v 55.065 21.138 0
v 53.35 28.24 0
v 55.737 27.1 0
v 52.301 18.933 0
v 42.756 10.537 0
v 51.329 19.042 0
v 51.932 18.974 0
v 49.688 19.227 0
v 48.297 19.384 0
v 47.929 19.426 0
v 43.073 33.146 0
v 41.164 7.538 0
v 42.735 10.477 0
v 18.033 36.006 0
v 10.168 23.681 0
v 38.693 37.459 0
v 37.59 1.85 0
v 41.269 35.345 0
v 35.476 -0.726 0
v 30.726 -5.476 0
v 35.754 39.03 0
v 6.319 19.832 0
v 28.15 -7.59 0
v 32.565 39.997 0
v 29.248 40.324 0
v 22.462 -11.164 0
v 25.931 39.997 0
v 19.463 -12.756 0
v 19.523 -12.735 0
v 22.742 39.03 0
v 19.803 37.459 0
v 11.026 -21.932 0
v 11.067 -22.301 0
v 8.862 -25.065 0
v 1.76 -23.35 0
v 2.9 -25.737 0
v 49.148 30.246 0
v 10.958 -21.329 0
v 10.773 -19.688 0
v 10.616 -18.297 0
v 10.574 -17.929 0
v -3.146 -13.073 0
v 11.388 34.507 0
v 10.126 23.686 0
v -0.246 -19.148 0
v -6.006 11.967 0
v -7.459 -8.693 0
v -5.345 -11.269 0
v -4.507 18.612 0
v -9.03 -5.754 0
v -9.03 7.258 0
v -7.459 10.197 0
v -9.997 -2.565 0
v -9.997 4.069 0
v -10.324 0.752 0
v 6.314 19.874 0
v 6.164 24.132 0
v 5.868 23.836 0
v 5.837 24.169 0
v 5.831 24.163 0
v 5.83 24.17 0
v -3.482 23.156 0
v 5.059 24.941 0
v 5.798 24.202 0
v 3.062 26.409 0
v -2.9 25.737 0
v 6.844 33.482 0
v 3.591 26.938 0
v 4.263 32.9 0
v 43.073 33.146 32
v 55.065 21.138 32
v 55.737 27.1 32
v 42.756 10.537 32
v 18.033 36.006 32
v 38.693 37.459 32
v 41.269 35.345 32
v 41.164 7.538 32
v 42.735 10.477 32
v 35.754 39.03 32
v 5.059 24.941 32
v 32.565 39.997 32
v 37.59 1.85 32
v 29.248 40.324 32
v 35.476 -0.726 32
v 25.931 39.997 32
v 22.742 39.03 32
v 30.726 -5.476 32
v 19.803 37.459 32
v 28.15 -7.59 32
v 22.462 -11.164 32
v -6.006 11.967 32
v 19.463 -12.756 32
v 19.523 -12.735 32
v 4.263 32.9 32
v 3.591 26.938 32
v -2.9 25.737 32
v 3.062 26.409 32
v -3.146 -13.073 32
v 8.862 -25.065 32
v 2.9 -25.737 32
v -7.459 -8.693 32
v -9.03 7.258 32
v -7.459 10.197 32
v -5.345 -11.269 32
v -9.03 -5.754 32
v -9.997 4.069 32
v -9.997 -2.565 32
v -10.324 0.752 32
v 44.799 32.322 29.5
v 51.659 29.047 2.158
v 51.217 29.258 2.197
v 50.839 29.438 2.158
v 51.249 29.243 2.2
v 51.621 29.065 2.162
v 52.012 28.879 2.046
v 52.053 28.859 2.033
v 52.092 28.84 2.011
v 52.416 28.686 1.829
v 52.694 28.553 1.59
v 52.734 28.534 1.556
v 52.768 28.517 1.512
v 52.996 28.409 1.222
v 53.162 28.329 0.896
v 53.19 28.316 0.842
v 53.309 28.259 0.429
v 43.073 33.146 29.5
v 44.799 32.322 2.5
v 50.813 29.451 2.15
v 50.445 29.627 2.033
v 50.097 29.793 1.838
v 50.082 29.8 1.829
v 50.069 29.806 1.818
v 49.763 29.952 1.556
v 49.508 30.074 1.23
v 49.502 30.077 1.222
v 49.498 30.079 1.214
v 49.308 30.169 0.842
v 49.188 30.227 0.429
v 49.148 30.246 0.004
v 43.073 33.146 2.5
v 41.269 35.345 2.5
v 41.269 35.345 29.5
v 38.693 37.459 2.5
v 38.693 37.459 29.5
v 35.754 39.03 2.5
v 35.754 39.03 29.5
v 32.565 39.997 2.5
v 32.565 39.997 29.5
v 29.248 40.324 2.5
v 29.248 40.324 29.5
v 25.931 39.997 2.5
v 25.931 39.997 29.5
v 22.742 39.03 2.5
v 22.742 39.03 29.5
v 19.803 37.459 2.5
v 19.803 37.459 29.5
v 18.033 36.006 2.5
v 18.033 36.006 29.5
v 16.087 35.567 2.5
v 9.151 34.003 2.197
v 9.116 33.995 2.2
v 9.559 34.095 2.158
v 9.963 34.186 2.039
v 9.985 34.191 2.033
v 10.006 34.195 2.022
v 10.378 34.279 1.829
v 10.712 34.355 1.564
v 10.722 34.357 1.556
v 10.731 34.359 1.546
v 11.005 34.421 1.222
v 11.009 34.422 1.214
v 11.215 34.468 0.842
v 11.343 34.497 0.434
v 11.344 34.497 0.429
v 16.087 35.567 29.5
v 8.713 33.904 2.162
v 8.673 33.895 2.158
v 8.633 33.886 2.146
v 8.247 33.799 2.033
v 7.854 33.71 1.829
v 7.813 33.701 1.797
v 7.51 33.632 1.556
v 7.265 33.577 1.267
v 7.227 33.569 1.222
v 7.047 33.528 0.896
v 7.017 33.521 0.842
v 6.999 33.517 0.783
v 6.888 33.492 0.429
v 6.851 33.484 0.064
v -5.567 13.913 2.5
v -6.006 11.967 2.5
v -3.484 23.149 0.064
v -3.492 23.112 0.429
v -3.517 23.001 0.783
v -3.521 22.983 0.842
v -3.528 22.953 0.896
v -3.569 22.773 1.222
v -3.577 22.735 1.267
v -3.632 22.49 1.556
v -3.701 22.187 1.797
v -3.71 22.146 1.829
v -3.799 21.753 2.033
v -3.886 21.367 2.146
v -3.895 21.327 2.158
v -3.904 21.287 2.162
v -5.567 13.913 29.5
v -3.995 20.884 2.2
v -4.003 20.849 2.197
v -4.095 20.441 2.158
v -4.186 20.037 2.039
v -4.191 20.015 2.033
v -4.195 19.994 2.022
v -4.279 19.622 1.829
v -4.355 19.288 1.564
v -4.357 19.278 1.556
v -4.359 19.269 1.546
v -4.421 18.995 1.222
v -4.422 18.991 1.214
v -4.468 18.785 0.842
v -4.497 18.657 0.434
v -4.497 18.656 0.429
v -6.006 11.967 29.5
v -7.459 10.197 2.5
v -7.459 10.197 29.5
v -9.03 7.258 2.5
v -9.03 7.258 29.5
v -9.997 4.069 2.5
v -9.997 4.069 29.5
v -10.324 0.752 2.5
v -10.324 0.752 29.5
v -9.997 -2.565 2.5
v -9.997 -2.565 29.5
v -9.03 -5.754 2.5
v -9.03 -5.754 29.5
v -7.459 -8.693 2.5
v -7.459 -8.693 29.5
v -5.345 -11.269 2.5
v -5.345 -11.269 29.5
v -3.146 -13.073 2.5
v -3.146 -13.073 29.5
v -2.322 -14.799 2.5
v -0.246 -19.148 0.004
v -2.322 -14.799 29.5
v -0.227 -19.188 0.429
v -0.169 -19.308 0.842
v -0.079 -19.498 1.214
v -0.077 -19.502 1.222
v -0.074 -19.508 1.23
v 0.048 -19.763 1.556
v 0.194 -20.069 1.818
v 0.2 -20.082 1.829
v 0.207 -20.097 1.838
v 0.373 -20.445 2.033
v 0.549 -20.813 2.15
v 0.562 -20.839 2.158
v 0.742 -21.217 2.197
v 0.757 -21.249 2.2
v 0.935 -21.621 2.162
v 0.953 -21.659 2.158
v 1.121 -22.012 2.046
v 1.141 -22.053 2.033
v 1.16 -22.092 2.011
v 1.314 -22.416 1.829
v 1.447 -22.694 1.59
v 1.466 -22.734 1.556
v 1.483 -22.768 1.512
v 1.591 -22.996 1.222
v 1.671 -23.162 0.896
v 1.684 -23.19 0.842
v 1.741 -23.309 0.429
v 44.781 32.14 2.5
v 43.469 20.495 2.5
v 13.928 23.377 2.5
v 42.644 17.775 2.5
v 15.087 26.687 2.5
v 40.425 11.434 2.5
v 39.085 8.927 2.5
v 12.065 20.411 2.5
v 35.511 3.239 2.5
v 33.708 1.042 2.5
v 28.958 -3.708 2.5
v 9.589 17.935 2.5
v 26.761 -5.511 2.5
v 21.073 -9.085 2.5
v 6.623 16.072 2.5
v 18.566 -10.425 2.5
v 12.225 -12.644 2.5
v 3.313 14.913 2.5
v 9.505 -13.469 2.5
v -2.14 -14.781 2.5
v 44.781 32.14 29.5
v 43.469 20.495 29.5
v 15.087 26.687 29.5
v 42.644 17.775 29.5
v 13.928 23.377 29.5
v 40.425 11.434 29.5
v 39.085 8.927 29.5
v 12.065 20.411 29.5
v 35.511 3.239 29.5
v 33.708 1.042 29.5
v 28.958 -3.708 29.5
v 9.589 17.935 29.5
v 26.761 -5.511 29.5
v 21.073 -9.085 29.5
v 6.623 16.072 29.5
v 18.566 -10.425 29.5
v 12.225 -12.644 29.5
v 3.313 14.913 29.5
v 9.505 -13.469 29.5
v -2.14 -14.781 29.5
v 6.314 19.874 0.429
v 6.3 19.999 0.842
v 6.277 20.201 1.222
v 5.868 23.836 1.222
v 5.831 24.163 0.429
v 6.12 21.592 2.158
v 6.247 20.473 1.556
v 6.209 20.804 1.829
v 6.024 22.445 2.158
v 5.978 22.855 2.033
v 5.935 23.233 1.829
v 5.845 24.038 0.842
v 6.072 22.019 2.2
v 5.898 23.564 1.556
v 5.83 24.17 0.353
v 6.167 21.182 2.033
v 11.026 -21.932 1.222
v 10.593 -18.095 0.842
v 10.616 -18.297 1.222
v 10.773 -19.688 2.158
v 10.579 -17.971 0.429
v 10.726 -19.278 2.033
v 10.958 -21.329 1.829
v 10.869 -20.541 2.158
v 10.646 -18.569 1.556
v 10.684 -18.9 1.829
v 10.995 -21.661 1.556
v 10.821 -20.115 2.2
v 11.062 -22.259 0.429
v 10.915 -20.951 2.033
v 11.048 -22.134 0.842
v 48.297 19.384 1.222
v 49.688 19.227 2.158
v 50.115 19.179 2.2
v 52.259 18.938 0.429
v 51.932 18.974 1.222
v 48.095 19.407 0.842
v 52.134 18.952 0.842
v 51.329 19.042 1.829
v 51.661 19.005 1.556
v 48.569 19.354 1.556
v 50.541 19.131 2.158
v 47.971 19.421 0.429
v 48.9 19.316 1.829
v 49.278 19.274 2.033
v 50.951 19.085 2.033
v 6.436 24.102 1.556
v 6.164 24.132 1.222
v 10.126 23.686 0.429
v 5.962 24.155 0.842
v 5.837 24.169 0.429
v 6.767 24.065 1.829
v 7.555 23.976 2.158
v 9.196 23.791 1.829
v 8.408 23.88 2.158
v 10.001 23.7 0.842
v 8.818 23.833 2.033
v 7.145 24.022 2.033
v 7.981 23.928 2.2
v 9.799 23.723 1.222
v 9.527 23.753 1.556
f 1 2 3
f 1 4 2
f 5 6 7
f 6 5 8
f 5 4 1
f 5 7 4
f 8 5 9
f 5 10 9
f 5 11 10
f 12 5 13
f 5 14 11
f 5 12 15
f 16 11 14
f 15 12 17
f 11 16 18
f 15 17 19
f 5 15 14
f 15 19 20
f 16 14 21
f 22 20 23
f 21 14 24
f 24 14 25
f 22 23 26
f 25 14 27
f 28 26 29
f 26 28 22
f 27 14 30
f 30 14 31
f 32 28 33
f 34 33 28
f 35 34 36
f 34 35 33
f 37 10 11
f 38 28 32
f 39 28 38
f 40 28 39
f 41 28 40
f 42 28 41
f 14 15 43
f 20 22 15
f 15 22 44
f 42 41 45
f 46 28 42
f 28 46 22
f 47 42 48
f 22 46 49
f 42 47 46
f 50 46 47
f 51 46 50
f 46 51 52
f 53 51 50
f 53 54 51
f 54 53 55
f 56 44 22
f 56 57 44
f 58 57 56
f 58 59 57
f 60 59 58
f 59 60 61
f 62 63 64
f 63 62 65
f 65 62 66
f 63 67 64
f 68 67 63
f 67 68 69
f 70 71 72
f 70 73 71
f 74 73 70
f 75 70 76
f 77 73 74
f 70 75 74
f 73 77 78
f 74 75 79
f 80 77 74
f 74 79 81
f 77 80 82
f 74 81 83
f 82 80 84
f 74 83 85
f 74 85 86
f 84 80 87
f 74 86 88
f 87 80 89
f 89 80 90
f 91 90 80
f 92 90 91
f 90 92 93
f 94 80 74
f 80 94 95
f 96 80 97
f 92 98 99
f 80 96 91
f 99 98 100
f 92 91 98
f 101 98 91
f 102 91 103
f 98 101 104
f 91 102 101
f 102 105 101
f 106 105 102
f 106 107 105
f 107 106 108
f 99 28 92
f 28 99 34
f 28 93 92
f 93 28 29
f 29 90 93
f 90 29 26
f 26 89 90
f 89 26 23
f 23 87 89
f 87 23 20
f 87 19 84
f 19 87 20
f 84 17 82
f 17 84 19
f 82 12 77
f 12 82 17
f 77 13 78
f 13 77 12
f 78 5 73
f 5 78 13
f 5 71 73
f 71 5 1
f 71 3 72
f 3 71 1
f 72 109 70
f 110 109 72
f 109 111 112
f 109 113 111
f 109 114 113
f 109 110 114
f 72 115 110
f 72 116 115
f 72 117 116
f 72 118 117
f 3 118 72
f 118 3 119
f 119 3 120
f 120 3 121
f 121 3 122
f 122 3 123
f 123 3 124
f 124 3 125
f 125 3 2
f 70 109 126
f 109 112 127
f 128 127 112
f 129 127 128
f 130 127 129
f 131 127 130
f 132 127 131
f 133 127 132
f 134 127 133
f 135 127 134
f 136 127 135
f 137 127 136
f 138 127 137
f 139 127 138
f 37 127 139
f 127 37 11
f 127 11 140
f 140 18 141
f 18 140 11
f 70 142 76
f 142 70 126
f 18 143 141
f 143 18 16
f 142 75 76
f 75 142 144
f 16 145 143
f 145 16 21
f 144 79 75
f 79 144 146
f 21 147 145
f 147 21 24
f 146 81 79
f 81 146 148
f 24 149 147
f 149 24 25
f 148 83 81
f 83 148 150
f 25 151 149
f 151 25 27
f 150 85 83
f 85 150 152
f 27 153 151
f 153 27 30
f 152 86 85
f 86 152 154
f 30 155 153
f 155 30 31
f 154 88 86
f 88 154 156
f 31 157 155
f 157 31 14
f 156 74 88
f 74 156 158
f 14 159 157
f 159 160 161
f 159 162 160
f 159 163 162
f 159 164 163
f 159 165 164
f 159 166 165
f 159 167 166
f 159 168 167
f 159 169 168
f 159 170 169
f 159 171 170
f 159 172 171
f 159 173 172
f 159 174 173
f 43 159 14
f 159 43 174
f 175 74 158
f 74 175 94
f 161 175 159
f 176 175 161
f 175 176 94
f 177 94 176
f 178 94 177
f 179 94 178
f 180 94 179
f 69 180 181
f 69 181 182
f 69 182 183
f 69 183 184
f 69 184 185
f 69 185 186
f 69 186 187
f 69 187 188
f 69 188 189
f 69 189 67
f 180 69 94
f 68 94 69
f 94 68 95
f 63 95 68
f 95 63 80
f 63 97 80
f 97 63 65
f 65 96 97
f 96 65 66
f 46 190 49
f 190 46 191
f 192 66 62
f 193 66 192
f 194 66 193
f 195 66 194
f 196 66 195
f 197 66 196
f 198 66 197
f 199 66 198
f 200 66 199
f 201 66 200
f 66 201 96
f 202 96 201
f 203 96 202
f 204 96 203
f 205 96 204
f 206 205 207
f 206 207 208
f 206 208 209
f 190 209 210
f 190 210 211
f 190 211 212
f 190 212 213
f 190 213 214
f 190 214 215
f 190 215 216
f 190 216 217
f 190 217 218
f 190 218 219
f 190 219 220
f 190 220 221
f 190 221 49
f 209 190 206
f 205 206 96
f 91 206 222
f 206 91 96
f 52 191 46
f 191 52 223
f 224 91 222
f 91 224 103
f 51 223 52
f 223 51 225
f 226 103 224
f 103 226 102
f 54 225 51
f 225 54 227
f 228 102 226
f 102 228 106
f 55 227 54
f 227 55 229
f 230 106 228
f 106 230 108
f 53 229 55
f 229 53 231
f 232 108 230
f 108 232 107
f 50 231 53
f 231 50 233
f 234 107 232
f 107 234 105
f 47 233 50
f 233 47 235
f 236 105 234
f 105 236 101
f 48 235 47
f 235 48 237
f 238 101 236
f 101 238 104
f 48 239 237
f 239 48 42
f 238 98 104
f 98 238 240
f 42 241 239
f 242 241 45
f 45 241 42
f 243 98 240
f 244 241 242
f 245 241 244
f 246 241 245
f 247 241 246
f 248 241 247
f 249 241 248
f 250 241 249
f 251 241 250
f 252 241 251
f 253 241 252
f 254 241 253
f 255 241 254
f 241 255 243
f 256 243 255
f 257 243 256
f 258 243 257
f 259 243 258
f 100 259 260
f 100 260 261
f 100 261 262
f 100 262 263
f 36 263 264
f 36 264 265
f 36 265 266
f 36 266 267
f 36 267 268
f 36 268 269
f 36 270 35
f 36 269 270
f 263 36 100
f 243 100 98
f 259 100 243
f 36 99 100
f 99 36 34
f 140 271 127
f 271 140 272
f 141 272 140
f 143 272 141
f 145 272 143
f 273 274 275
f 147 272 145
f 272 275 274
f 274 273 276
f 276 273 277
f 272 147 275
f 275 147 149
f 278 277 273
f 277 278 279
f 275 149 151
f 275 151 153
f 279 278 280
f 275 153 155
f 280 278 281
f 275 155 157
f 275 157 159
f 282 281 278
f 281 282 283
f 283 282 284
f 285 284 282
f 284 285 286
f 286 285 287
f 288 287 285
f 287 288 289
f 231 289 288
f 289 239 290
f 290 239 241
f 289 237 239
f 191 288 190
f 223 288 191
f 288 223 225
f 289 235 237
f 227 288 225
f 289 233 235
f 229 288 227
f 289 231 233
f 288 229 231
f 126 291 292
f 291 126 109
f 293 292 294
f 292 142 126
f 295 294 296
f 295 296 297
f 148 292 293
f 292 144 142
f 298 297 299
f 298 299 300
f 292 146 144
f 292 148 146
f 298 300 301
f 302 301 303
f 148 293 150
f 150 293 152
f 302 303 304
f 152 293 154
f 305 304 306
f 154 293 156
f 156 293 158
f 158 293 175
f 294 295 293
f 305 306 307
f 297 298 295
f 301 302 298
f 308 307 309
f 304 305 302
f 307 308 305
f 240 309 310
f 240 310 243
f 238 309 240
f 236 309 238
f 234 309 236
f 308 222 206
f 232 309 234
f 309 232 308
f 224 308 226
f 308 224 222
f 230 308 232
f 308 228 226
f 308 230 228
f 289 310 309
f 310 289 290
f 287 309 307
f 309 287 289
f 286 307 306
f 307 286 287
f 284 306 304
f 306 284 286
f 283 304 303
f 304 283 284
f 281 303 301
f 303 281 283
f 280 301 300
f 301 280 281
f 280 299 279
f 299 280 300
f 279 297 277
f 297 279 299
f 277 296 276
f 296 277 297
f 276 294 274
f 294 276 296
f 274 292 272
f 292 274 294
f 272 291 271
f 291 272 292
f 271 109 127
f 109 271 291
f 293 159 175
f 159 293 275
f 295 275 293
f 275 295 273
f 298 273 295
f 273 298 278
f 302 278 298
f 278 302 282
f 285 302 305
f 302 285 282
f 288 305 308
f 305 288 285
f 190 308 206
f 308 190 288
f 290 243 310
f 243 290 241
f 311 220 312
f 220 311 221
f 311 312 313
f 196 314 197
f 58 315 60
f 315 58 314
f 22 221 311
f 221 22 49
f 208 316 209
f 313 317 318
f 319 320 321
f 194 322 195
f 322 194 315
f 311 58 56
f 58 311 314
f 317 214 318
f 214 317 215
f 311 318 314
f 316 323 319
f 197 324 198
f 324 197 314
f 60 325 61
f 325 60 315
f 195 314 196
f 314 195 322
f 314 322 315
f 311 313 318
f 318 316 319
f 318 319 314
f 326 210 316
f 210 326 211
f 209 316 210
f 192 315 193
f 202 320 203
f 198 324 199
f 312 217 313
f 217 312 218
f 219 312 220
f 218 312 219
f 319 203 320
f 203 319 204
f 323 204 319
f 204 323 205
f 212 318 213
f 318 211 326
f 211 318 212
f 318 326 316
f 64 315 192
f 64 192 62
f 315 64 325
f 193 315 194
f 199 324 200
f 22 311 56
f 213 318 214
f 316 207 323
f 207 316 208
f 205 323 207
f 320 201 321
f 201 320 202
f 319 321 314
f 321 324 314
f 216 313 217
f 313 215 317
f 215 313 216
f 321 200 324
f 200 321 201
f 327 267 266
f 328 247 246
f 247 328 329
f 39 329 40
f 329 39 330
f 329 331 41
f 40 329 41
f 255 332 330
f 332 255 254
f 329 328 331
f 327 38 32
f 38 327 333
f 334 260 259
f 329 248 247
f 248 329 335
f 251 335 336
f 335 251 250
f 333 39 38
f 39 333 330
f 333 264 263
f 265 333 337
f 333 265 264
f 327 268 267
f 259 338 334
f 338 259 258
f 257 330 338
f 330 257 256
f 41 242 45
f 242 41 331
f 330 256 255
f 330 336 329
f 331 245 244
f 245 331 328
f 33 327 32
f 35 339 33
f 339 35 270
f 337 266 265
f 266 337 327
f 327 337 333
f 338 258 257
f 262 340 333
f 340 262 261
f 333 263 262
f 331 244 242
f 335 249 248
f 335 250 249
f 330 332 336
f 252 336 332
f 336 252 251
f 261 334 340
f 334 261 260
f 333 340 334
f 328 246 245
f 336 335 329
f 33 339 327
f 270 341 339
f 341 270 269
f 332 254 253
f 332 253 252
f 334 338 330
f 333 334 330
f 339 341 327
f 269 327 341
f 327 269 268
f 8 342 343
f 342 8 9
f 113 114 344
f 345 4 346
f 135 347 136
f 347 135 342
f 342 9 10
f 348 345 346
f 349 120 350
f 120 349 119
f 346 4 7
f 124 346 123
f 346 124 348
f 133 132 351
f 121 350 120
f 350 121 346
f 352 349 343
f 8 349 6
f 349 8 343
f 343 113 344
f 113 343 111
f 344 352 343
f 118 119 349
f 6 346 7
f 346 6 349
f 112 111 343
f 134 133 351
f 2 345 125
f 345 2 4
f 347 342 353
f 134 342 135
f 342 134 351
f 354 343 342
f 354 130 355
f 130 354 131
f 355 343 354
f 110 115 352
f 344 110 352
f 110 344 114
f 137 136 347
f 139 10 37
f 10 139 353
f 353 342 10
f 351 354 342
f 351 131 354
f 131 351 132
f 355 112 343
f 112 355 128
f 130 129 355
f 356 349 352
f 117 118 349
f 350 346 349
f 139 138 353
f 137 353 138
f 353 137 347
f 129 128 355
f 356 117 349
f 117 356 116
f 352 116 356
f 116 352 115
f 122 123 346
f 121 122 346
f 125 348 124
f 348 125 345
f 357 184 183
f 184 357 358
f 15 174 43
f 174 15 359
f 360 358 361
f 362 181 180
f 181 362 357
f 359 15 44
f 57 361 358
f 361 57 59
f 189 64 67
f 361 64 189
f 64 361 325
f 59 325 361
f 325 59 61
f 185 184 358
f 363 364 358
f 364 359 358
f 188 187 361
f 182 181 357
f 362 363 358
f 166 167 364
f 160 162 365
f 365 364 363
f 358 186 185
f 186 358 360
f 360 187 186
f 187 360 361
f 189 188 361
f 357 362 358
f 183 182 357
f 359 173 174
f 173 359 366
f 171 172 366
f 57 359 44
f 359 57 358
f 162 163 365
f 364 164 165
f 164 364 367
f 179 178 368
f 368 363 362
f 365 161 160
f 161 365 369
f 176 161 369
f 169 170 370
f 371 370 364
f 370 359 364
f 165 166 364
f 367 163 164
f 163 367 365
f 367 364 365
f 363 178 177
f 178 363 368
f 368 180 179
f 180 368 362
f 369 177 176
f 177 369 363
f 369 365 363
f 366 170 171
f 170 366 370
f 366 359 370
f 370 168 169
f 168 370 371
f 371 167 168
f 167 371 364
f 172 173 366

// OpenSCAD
$fn = 32;

// ----------------------------------------------------------------------
// Air duct: 34 mm duct, 2.5 mm wall, 32 mm across
// ----------------------------------------------------------------------

// --- parameters (mm) ---
duct_r = 17;              // duct core radius
duct_d = 34;              // duct core diameter
wall = 2.5;               // duct wall thickness
height = 32;              // duct width (extrusion height)
port_r = 25.9;            // port flange half width
port_d = 51.8;            // port flange width
port_t = 6;               // port flange thickness
bolt_d = 4.4;             // port bolt holes
bolt_offset = 21.2;       // bolt hole offset from the port axis

difference() {
  /* outer hull chain: tube with a flat flange plate at every port */
  linear_extrude(height = 32) {
    hull() {
      polygon([[2.9, -25.737], [-2.9, 25.737], [3.062, 26.409], [8.862, -25.065]]);
      translate([8.943, 1.008]) circle(r = 17);
    }
    hull() {
      translate([8.943, 1.008]) circle(r = 17);
      translate([6.676, 0.752]) circle(r = 17);
    }
    hull() {
      translate([6.676, 0.752]) circle(r = 17);
      translate([13.017, 2.971]) circle(r = 17);
    }
    hull() {
      translate([13.017, 2.971]) circle(r = 17);
      translate([18.705, 6.545]) circle(r = 17);
    }
    hull() {
      translate([18.705, 6.545]) circle(r = 17);
      translate([23.455, 11.295]) circle(r = 17);
    }
    hull() {
      translate([23.455, 11.295]) circle(r = 17);
      translate([27.029, 16.983]) circle(r = 17);
    }
    hull() {
      translate([27.029, 16.983]) circle(r = 17);
      translate([29.248, 23.324]) circle(r = 17);
    }
    hull() {
      translate([29.248, 23.324]) circle(r = 17);
      translate([28.992, 21.057]) circle(r = 17);
    }
    hull() {
      translate([28.992, 21.057]) circle(r = 17);
      polygon([[4.263, 32.9], [55.737, 27.1], [55.065, 21.138], [3.591, 26.938]]);
    }
  }
  /* air passage: the same chain inset by the wall, 5 mm proud of the ports */
  translate([0, 0, 2.5]) linear_extrude(height = 27) {
    hull() {
      translate([-4.969, -0.56]) circle(r = 14.5);
      translate([6.676, 0.752]) circle(r = 14.5);
    }
    hull() {
      translate([6.676, 0.752]) circle(r = 14.5);
      translate([13.017, 2.971]) circle(r = 14.5);
    }
    hull() {
      translate([13.017, 2.971]) circle(r = 14.5);
      translate([18.705, 6.545]) circle(r = 14.5);
    }
    hull() {
      translate([18.705, 6.545]) circle(r = 14.5);
      translate([23.455, 11.295]) circle(r = 14.5);
    }
    hull() {
      translate([23.455, 11.295]) circle(r = 14.5);
      translate([27.029, 16.983]) circle(r = 14.5);
    }
    hull() {
      translate([27.029, 16.983]) circle(r = 14.5);
      translate([29.248, 23.324]) circle(r = 14.5);
    }
    hull() {
      translate([29.248, 23.324]) circle(r = 14.5);
      translate([30.56, 34.969]) circle(r = 14.5);
    }
  }
  translate([0, 0]) rotate([0, 0, -83.57]) translate([-21.2, -2.5]) rotate([-90, 0, 0]) cylinder(h = 11, d = 4.4);
  translate([0, 0]) rotate([0, 0, -83.57]) translate([21.2, -2.5]) rotate([-90, 0, 0]) cylinder(h = 11, d = 4.4);
  translate([30, 30]) rotate([0, 0, 173.57]) translate([-21.2, -2.5]) rotate([-90, 0, 0]) cylinder(h = 11, d = 4.4);
  translate([30, 30]) rotate([0, 0, 173.57]) translate([21.2, -2.5]) rotate([-90, 0, 0]) cylinder(h = 11, d = 4.4);
}
